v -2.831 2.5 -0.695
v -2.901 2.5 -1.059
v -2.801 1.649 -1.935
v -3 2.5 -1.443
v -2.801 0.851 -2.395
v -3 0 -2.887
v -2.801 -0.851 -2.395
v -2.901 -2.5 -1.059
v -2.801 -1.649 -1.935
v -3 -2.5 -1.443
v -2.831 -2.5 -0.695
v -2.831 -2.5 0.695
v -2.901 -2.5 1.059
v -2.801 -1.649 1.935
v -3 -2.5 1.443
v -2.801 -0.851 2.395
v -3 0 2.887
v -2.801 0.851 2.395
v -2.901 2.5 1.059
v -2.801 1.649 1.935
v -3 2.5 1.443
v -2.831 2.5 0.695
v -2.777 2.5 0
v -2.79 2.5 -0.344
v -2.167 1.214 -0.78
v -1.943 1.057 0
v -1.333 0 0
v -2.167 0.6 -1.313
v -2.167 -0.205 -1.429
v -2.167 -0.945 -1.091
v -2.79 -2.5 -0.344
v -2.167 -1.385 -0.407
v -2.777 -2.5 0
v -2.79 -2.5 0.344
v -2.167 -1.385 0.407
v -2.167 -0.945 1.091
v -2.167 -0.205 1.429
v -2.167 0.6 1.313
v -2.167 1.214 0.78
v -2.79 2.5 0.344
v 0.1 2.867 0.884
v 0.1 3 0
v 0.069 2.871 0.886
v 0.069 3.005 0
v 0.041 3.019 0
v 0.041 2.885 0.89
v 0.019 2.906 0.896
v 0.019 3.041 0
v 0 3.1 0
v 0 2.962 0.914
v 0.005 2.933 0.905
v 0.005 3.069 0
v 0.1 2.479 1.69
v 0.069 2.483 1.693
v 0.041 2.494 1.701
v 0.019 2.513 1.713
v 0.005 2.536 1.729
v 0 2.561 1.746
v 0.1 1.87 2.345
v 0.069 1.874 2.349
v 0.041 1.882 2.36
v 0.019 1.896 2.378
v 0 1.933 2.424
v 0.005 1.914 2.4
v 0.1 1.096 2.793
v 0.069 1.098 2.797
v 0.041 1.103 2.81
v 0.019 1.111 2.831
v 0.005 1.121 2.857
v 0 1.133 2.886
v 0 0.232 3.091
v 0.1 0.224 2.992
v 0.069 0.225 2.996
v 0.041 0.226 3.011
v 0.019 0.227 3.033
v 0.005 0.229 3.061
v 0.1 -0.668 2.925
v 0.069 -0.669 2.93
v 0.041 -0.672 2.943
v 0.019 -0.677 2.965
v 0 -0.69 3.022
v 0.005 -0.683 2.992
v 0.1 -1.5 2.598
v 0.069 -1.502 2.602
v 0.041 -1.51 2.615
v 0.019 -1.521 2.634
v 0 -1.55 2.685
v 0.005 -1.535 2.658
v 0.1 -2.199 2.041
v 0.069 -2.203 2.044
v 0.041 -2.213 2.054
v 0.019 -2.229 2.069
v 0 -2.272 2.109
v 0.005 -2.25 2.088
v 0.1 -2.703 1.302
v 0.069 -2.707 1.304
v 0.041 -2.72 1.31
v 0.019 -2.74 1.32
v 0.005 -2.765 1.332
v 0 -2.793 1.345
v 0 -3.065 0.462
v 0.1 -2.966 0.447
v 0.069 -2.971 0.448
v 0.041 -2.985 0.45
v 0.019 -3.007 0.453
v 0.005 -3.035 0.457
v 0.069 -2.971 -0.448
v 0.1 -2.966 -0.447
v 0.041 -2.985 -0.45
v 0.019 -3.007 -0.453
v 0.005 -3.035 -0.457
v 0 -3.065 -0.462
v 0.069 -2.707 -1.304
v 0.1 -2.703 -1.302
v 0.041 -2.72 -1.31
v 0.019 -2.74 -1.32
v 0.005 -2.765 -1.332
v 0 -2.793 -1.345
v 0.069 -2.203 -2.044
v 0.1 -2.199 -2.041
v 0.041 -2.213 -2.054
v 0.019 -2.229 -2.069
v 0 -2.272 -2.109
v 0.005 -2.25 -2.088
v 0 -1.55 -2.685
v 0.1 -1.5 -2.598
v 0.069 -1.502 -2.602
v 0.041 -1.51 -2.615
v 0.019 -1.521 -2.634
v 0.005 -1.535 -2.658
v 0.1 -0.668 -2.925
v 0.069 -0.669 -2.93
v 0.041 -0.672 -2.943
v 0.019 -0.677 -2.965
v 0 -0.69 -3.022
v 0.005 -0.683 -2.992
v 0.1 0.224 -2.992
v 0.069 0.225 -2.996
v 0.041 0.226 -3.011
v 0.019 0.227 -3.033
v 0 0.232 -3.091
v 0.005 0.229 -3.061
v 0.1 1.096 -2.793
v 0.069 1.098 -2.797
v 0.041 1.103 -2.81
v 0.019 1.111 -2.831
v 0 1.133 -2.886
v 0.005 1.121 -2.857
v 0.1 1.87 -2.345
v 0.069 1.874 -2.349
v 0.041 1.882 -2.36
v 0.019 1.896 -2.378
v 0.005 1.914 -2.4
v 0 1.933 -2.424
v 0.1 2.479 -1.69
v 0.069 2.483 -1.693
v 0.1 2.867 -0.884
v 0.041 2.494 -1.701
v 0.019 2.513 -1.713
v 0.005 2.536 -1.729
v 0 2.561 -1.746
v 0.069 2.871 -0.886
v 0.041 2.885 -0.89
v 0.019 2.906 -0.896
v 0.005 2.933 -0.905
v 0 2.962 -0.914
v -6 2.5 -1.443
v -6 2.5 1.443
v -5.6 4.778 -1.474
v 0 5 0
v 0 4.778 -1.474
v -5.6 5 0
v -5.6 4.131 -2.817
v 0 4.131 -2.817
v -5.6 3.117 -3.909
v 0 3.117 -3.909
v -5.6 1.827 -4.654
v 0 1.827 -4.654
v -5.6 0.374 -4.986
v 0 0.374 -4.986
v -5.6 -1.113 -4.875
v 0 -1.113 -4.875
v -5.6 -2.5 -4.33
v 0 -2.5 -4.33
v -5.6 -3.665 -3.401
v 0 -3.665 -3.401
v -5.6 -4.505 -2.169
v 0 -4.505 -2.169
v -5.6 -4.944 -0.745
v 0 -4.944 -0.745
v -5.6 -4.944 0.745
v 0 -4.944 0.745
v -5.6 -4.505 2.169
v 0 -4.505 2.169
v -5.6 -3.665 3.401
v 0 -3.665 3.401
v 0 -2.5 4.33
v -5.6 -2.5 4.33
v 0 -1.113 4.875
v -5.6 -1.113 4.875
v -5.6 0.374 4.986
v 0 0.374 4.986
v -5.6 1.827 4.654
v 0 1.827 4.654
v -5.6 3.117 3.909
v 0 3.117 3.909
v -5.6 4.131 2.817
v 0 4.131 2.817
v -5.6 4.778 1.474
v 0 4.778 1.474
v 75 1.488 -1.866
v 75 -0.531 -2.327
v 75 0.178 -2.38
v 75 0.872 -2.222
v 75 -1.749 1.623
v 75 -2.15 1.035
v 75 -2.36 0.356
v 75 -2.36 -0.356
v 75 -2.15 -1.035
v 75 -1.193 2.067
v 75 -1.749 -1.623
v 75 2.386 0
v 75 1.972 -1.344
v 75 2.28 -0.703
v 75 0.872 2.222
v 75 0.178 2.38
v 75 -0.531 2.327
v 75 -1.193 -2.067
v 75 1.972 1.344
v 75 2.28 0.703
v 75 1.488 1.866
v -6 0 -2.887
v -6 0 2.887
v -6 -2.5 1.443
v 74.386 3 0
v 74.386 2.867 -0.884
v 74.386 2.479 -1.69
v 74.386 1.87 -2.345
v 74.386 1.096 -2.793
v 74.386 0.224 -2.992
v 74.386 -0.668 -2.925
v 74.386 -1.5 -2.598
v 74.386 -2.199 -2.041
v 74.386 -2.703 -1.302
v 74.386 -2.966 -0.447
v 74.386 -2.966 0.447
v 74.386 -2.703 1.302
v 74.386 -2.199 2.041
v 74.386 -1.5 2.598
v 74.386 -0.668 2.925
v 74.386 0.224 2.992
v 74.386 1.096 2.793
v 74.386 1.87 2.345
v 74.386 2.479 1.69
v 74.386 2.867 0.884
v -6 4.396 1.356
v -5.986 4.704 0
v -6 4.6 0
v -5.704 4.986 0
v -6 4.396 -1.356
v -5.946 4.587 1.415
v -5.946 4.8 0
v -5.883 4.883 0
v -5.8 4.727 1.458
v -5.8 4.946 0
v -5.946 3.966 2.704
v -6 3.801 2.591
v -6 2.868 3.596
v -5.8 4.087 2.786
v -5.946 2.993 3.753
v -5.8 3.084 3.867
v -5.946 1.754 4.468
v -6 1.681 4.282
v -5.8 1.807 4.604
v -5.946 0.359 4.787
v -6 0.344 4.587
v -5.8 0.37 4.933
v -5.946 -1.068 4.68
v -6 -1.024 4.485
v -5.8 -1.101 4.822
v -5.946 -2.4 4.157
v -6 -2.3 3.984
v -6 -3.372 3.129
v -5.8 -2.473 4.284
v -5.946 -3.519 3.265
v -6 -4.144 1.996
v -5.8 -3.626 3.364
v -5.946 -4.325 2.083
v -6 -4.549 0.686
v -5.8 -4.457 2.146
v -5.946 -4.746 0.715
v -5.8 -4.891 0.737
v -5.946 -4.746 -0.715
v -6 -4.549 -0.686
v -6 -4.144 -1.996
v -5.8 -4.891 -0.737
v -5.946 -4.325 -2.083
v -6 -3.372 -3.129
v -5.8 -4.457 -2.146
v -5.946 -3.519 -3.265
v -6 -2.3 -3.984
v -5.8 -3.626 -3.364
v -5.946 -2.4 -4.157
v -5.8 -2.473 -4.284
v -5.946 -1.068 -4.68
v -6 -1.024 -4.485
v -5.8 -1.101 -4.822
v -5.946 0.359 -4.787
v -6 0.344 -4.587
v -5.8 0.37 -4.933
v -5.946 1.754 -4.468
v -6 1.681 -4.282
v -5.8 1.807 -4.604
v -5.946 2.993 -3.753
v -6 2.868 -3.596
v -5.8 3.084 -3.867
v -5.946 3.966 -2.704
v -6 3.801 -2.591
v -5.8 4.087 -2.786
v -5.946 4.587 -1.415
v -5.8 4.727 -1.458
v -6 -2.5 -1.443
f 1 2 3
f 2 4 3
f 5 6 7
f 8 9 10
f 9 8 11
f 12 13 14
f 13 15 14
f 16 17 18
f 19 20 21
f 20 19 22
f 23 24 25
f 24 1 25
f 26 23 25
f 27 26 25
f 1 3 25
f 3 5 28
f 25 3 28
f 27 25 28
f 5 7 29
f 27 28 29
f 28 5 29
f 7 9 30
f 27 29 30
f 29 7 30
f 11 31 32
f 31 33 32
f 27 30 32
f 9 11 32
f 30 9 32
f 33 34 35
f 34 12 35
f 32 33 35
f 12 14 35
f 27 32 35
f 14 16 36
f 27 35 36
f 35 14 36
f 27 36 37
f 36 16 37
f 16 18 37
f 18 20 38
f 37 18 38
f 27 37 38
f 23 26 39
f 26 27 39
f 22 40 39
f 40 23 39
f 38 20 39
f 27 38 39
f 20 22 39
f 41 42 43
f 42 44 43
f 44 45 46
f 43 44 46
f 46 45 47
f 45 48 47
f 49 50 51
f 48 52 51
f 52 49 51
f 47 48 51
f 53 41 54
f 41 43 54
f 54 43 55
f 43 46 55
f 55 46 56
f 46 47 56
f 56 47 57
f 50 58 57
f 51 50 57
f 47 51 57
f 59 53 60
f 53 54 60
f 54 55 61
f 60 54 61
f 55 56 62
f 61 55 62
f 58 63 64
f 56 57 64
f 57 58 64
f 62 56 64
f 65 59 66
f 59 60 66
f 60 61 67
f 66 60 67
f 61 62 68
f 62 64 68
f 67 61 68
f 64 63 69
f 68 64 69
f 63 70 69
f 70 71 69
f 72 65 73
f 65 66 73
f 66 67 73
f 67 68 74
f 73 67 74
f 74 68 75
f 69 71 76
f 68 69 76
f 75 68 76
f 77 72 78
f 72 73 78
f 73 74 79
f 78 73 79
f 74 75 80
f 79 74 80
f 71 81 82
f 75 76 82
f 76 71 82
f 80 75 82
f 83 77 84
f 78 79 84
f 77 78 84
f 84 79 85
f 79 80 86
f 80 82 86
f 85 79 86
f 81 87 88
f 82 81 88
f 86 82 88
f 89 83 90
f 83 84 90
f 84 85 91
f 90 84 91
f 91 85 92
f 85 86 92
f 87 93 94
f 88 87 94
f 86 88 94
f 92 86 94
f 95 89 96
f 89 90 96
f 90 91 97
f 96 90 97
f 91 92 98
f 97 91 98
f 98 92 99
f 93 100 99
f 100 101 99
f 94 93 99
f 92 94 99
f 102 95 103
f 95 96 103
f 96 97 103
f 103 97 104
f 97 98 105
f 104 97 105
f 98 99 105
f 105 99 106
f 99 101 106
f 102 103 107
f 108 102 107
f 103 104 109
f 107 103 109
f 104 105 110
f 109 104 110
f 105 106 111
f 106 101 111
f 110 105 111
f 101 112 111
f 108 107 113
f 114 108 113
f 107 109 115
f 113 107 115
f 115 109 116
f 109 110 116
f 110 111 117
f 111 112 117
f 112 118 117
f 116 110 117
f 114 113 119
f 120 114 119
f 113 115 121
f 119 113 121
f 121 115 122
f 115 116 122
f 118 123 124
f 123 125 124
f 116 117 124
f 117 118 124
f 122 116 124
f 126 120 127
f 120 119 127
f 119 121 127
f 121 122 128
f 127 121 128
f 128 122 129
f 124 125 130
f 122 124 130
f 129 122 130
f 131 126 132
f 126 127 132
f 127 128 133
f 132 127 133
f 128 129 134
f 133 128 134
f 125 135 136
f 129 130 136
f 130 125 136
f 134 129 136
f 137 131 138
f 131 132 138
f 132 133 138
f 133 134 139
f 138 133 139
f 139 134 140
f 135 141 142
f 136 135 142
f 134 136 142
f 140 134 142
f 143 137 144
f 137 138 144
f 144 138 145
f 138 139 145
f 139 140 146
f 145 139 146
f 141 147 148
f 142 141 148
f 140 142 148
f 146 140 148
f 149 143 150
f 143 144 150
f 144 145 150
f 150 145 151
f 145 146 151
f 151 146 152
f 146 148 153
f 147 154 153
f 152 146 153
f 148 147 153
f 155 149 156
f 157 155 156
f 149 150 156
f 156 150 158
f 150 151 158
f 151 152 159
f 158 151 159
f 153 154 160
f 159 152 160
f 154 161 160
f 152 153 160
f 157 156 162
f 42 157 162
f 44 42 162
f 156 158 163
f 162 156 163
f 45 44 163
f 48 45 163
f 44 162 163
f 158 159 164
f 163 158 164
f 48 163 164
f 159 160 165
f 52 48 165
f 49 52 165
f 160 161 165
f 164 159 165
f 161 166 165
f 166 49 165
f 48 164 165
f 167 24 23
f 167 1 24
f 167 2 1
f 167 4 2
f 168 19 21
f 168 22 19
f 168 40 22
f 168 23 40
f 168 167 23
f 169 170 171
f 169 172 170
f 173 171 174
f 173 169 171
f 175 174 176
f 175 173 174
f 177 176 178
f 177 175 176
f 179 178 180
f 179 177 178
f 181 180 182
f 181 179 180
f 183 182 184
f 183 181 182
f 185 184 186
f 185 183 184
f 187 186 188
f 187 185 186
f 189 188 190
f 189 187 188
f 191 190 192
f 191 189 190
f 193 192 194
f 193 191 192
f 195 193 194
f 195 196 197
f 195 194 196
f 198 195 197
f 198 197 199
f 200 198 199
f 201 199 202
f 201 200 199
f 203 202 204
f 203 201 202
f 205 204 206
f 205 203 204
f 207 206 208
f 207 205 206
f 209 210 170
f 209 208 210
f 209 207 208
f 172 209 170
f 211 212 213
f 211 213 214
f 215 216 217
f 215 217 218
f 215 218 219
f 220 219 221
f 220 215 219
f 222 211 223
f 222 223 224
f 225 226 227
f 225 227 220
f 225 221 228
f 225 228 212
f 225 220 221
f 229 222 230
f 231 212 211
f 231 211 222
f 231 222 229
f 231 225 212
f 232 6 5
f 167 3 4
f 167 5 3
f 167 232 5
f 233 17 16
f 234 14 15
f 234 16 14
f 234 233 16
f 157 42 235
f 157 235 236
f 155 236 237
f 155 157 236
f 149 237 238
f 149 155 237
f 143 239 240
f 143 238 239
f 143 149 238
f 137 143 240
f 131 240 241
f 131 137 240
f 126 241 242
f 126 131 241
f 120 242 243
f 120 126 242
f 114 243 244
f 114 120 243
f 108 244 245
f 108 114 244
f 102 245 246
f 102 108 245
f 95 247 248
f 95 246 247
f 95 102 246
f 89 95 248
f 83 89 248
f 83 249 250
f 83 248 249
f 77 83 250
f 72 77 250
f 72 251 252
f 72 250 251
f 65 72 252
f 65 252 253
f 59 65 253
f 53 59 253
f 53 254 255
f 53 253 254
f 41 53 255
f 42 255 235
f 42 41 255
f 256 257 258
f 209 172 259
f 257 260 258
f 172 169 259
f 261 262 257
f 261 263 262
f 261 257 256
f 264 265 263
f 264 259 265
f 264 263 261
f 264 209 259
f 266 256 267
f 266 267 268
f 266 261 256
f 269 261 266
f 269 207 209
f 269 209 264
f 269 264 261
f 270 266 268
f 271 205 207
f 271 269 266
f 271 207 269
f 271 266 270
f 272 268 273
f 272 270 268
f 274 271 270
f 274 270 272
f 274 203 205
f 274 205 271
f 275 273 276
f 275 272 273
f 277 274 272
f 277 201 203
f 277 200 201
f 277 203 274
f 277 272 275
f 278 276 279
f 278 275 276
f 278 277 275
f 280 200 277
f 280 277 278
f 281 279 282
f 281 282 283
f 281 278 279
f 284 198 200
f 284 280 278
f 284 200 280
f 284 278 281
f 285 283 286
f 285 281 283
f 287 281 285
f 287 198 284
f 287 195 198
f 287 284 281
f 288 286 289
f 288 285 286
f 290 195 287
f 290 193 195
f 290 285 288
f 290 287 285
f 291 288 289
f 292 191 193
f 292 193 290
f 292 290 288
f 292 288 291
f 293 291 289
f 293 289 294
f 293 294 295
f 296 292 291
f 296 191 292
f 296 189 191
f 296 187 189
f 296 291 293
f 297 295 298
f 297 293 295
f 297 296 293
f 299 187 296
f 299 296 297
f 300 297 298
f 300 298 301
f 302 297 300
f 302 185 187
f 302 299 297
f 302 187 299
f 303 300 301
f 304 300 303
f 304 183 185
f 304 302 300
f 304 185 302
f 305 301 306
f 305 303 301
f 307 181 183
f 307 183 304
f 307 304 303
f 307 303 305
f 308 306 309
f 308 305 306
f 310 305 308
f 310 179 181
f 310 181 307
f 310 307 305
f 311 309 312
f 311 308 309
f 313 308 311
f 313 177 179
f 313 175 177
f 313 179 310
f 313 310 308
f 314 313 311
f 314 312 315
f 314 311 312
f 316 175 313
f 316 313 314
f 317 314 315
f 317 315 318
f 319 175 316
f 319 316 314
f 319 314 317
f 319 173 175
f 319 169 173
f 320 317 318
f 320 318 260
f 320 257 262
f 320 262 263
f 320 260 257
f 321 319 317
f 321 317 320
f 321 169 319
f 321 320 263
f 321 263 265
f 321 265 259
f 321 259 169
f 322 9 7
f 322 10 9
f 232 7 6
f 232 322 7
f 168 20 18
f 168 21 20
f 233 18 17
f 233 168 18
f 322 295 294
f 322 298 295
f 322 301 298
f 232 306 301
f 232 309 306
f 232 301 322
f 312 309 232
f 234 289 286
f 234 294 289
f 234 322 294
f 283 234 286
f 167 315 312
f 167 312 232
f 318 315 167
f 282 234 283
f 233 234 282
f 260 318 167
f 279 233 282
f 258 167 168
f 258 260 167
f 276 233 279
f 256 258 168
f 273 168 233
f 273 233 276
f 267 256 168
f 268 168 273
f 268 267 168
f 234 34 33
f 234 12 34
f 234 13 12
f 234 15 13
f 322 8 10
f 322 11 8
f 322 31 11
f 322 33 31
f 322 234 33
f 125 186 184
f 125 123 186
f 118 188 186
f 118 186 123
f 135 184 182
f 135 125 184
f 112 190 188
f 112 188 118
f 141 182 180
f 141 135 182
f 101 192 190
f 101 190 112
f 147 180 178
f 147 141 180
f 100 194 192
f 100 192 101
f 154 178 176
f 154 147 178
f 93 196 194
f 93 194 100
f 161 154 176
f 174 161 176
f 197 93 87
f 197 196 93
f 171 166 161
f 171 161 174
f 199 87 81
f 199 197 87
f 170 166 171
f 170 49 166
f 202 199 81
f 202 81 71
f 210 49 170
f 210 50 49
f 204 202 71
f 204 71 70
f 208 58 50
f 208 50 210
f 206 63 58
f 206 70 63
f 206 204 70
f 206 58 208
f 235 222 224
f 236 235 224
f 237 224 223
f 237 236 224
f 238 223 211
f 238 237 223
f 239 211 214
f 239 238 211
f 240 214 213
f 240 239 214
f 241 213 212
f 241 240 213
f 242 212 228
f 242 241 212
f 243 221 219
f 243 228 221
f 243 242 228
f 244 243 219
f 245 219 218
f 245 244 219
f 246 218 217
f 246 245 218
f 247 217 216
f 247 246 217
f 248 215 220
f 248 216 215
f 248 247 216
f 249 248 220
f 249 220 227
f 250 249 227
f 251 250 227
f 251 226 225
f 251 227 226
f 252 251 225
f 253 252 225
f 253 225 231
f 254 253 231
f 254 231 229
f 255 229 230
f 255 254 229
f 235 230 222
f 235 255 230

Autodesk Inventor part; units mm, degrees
ref_plane "YZ Plane" through (0, 0, 0) normal (1, 0, 0) x (0, 1, 0)
ref_plane "XZ Plane" through (0, 0, 0) normal (0, 1, 0) x (-1, 0, 0)
sketch "Sketch1" plane through (0, 0, 0) normal (0, 0, 1) x (1, 0, 0)
  line L0 (-1.3333, 0) -> (75, 0)
  line L1 (75, 0) -> (75, 3)
  line L2 (75, 3) -> (51, 3)
  line L3 (51, 3) -> (50.3865, 3)
  line L4 (50.3865, 3) -> (0, 3)
  line L5 (0, 3) -> (0, 5)
  line L6 (0, 5) -> (-6, 5)
  line L7 (-6, 5) -> (-6, 2.8868)
  line L8 (-6, 2.8868) -> (-3, 2.8868)
  line L9 (-3, 2.8868) -> (-1.3333, 0)
  line L10 (-22.2, 0) -> (91.2, 0) projected
  line L11 (0, -1) -> (0, 6) projected
  line L12 (51, 3) -> (0, 3) construction
  dimension "d1" = 24
  dimension "d2" = 0.6136
  dimension "d3" = 6
  dimension "d4" = 3
  dimension "d5" = 60
  dimension "d6" = 6
  dimension "d7" = 6
  dimension "d8" = 5.7735
  dimension "d9" = 10
  dimension "d26" = 75
revolve "Body" add sketch "Sketch1" angle 360 about axis through (-1.3333, 0, 0) along (1, 0, 0)
sketch "Sketch2" plane through (-6, 0, 0) normal (-1, 0, 0) x (0, 0, 1)
  circle A0 centre (0, 0) radius 2.8868 projected
  line L0 (0, -7) -> (0, 7) projected
  line L1 (-7, 0) -> (7, 0) projected
  line L2 (2.8868, 0) -> (1.4434, -2.5)
  line L3 (1.4434, -2.5) -> (-1.4434, -2.5)
  line L4 (-1.4434, -2.5) -> (-2.8868, 0)
  line L5 (-2.8868, 0) -> (-1.4434, 2.5)
  line L6 (-1.4434, 2.5) -> (1.4434, 2.5)
  line L7 (1.4434, 2.5) -> (2.8868, 0)
extrude "Slot" add sketch "Sketch2" against normal up to next contours L7 A0 | A0 L2 | L6 L0 A0 | A0 L0 L3 | L0 L6 A0 | A0 L3 L0 | L4 A0 | A0 L5
fillet "Fillet1" radius 0.4 1 edges at (-6, -5, 0)
thread "Thread" size "M6x1" class "6g" standard "ISO Metric profile" length 24
chamfer "Chamfer1" distance 0.6135 distance2 0.6135 1 edges at (75, -3, 0) measured on face at (75, -0.9709, -1.4067)
ref_plane "Work Plane1" through (29, 0, 0) normal (0, -1, 0) x (1, 0, 0)
fillet "Fillet2" radius 0.1 1 edges at (0, -3, 0)
equation "\"d1\" = GEL"
equation "\"d3\" = KOH"
equation "\"d4\" = INTI"
equation "\"d6\" = GD"
equation "\"d7\" = BDM"
equation "\"d8\" = 1.1547 * SW"
equation "\"d9\" = KOD"
equation "\"d26\" = NLG"
equation "\"d30\" = R"
equation "\"d17\" = RR"
equation "\"d13\" = GEL"
equation "\"d15\" = -0.5 * SPD + 0.5 * GD"
equation "\"d16\" = GUL"
equation "\"GD\" = NND"
equation "\"NLG\" = 75"
equation "\"GEL\" = 24"
equation "\"KOD\" = 10"
equation "\"KOH\" = NND"
equation "\"INTI\" = 3"
equation "\"GAL\" = 0.61345 * PTC"
equation "\"GUL\" = 0.61345 * PTC"
equation "\"BDM\" = NND"
equation "\"SW\" = 5"
equation "\"RR\" = 0.4"
equation "\"SPD\" = NND - 1.2269 * PTC"
equation "\"R\" = 0.1"
equation "\"PHH\" = 0.1 * NND"
equation "\"GD1\" = THREADDIA - 1.2269 * PTC"
equation "\"THREADDIA\" = 6"
equation "\"FAWI\" = 45deg"
equation "\"PTC\" = 1"
equation "\"NND\" = 6"
equation "\"FAWI1\" = 30deg"
equation "\"TOA\" = 30deg"
equation "\"E0\" = 1.155 * SW"
properties part number "Unbrako - M6 x 75" material "Steel, Mild"
